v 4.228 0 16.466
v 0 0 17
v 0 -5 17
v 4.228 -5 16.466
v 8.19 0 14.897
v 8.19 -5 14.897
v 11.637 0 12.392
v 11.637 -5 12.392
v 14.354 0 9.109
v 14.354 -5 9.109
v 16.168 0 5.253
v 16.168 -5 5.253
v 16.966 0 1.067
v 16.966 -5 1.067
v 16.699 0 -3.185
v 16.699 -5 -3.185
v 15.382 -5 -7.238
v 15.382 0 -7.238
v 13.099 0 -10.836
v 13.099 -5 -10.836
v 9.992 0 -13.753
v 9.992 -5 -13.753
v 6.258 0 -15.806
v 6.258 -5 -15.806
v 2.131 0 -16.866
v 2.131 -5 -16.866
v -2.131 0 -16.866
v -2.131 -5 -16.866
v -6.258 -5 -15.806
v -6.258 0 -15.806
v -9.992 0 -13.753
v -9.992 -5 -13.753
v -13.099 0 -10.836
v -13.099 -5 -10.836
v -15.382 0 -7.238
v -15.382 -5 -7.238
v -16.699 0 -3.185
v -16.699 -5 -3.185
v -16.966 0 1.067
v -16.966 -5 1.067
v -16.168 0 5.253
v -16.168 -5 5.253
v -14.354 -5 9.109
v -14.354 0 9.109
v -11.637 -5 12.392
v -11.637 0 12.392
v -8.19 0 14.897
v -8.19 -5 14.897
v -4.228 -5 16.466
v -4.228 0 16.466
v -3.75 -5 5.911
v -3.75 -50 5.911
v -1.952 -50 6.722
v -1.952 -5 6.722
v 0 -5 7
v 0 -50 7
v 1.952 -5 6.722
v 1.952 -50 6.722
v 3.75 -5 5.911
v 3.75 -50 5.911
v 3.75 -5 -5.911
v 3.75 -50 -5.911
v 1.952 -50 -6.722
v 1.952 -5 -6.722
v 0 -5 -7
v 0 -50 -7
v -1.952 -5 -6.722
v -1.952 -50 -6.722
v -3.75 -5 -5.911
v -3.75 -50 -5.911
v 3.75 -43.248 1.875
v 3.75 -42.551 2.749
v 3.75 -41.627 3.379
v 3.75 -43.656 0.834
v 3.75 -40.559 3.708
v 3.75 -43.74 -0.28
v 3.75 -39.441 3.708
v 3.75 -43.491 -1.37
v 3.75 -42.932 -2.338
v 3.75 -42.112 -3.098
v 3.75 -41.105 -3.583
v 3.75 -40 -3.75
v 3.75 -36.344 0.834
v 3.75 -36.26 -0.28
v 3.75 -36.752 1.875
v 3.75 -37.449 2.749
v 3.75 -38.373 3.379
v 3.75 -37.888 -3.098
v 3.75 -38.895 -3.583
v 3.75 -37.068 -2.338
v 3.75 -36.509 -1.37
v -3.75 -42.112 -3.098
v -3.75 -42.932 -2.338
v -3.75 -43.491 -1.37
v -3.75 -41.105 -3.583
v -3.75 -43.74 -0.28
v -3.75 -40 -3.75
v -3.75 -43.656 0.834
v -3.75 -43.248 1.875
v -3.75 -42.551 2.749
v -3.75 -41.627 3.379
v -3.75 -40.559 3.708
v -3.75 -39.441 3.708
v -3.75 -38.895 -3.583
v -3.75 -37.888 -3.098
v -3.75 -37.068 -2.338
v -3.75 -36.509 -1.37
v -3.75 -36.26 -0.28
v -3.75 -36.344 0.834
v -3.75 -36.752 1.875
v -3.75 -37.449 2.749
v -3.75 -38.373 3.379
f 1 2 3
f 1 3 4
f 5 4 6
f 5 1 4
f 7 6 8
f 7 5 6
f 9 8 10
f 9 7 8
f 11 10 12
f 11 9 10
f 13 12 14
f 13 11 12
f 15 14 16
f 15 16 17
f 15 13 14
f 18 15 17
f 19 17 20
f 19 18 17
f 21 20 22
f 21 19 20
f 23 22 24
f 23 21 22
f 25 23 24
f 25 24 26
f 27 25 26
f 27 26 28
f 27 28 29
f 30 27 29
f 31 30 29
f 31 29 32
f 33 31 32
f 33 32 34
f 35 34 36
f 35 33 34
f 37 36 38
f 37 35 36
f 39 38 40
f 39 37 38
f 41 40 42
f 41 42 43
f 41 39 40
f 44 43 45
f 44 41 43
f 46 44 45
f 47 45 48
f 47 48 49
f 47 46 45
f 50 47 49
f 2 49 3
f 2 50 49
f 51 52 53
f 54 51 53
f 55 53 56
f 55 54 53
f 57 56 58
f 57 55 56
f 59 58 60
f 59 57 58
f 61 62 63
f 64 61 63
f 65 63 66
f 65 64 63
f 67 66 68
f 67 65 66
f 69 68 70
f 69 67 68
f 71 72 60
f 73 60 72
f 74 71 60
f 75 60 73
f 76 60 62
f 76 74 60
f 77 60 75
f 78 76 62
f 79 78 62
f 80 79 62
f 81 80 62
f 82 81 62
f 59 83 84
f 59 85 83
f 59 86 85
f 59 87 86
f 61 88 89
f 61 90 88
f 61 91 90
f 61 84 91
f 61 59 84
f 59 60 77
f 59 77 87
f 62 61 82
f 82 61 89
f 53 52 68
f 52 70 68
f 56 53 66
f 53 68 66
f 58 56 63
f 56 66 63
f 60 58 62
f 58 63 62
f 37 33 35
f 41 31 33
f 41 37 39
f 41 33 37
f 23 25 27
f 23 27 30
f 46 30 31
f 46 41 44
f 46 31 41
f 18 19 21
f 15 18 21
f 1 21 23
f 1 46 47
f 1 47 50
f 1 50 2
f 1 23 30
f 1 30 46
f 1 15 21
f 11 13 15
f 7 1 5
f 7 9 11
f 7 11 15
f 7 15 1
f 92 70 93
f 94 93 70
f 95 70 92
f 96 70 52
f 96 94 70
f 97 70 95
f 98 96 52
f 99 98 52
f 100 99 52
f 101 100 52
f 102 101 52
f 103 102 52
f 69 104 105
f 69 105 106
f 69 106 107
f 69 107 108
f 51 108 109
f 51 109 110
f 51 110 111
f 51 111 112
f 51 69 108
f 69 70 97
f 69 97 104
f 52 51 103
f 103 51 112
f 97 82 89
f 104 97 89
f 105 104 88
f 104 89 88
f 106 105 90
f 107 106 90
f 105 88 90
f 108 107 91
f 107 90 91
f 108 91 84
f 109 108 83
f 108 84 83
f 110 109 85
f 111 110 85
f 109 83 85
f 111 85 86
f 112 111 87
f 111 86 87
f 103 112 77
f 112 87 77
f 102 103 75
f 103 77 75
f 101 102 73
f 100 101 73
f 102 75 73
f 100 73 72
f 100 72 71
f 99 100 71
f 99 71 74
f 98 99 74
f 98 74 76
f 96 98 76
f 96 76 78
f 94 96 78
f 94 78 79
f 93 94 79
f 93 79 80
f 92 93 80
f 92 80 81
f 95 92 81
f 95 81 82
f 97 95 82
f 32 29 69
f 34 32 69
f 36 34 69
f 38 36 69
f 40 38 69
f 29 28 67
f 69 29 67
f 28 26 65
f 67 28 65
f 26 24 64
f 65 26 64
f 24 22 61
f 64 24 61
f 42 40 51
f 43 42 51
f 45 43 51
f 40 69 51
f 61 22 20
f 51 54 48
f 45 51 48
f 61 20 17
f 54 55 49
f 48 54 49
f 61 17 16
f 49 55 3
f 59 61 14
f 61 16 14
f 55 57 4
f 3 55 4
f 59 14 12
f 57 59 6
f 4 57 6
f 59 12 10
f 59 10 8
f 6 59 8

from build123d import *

# Parameters (mm, degrees)
SKETCH1_R           = 17
BOSS_EXTRUDE1_DEPTH = 5
BOSS_EXTRUDE2_START = -5
BOSS_EXTRUDE2_DEPTH = 45
SKETCH2_R           = 3.75
CUT_EXTRUDE1_DEPTH  = 57.741188743


with BuildPart() as part:
    # Sketch1 → Boss-Extrude1 (new body)
    with BuildSketch(Plane(origin=(0, 0, 0), x_dir=(1, 0, 0), z_dir=(0, 1, 0))):
        with Locations(Location((0, 0, 0), (0, 0, 270))):
            Circle(SKETCH1_R)
    extrude(amount=-BOSS_EXTRUDE1_DEPTH)

    # Sketch1<3> → Boss-Extrude2 (add)
    with BuildSketch(Plane(origin=(0, 0, 0), x_dir=(1, 0, 0), z_dir=(0, 1, 0)).offset(BOSS_EXTRUDE2_START)):
        with BuildLine():
            ThreePointArc((-3.75, -5.910795209), (0, -7), (3.75, -5.910795209))
            Line((3.75, -5.910795209), (3.75, 5.910795209))
            ThreePointArc((3.75, 5.910795209), (0, 7), (-3.75, 5.910795209))
            Line((-3.75, 5.910795209), (-3.75, -5.910795209))
        make_face()
    extrude(amount=-BOSS_EXTRUDE2_DEPTH)

    # Sketch2 → Cut-Extrude1 (cut, through all)
    with BuildSketch(Plane(origin=(3.75, 0, 0), x_dir=(0, 0, -1), z_dir=(1, 0, 0))):
        with Locations((0, -40)):
            Circle(SKETCH2_R)
    extrude(amount=-CUT_EXTRUDE1_DEPTH, mode=Mode.SUBTRACT)


solid = part.part
